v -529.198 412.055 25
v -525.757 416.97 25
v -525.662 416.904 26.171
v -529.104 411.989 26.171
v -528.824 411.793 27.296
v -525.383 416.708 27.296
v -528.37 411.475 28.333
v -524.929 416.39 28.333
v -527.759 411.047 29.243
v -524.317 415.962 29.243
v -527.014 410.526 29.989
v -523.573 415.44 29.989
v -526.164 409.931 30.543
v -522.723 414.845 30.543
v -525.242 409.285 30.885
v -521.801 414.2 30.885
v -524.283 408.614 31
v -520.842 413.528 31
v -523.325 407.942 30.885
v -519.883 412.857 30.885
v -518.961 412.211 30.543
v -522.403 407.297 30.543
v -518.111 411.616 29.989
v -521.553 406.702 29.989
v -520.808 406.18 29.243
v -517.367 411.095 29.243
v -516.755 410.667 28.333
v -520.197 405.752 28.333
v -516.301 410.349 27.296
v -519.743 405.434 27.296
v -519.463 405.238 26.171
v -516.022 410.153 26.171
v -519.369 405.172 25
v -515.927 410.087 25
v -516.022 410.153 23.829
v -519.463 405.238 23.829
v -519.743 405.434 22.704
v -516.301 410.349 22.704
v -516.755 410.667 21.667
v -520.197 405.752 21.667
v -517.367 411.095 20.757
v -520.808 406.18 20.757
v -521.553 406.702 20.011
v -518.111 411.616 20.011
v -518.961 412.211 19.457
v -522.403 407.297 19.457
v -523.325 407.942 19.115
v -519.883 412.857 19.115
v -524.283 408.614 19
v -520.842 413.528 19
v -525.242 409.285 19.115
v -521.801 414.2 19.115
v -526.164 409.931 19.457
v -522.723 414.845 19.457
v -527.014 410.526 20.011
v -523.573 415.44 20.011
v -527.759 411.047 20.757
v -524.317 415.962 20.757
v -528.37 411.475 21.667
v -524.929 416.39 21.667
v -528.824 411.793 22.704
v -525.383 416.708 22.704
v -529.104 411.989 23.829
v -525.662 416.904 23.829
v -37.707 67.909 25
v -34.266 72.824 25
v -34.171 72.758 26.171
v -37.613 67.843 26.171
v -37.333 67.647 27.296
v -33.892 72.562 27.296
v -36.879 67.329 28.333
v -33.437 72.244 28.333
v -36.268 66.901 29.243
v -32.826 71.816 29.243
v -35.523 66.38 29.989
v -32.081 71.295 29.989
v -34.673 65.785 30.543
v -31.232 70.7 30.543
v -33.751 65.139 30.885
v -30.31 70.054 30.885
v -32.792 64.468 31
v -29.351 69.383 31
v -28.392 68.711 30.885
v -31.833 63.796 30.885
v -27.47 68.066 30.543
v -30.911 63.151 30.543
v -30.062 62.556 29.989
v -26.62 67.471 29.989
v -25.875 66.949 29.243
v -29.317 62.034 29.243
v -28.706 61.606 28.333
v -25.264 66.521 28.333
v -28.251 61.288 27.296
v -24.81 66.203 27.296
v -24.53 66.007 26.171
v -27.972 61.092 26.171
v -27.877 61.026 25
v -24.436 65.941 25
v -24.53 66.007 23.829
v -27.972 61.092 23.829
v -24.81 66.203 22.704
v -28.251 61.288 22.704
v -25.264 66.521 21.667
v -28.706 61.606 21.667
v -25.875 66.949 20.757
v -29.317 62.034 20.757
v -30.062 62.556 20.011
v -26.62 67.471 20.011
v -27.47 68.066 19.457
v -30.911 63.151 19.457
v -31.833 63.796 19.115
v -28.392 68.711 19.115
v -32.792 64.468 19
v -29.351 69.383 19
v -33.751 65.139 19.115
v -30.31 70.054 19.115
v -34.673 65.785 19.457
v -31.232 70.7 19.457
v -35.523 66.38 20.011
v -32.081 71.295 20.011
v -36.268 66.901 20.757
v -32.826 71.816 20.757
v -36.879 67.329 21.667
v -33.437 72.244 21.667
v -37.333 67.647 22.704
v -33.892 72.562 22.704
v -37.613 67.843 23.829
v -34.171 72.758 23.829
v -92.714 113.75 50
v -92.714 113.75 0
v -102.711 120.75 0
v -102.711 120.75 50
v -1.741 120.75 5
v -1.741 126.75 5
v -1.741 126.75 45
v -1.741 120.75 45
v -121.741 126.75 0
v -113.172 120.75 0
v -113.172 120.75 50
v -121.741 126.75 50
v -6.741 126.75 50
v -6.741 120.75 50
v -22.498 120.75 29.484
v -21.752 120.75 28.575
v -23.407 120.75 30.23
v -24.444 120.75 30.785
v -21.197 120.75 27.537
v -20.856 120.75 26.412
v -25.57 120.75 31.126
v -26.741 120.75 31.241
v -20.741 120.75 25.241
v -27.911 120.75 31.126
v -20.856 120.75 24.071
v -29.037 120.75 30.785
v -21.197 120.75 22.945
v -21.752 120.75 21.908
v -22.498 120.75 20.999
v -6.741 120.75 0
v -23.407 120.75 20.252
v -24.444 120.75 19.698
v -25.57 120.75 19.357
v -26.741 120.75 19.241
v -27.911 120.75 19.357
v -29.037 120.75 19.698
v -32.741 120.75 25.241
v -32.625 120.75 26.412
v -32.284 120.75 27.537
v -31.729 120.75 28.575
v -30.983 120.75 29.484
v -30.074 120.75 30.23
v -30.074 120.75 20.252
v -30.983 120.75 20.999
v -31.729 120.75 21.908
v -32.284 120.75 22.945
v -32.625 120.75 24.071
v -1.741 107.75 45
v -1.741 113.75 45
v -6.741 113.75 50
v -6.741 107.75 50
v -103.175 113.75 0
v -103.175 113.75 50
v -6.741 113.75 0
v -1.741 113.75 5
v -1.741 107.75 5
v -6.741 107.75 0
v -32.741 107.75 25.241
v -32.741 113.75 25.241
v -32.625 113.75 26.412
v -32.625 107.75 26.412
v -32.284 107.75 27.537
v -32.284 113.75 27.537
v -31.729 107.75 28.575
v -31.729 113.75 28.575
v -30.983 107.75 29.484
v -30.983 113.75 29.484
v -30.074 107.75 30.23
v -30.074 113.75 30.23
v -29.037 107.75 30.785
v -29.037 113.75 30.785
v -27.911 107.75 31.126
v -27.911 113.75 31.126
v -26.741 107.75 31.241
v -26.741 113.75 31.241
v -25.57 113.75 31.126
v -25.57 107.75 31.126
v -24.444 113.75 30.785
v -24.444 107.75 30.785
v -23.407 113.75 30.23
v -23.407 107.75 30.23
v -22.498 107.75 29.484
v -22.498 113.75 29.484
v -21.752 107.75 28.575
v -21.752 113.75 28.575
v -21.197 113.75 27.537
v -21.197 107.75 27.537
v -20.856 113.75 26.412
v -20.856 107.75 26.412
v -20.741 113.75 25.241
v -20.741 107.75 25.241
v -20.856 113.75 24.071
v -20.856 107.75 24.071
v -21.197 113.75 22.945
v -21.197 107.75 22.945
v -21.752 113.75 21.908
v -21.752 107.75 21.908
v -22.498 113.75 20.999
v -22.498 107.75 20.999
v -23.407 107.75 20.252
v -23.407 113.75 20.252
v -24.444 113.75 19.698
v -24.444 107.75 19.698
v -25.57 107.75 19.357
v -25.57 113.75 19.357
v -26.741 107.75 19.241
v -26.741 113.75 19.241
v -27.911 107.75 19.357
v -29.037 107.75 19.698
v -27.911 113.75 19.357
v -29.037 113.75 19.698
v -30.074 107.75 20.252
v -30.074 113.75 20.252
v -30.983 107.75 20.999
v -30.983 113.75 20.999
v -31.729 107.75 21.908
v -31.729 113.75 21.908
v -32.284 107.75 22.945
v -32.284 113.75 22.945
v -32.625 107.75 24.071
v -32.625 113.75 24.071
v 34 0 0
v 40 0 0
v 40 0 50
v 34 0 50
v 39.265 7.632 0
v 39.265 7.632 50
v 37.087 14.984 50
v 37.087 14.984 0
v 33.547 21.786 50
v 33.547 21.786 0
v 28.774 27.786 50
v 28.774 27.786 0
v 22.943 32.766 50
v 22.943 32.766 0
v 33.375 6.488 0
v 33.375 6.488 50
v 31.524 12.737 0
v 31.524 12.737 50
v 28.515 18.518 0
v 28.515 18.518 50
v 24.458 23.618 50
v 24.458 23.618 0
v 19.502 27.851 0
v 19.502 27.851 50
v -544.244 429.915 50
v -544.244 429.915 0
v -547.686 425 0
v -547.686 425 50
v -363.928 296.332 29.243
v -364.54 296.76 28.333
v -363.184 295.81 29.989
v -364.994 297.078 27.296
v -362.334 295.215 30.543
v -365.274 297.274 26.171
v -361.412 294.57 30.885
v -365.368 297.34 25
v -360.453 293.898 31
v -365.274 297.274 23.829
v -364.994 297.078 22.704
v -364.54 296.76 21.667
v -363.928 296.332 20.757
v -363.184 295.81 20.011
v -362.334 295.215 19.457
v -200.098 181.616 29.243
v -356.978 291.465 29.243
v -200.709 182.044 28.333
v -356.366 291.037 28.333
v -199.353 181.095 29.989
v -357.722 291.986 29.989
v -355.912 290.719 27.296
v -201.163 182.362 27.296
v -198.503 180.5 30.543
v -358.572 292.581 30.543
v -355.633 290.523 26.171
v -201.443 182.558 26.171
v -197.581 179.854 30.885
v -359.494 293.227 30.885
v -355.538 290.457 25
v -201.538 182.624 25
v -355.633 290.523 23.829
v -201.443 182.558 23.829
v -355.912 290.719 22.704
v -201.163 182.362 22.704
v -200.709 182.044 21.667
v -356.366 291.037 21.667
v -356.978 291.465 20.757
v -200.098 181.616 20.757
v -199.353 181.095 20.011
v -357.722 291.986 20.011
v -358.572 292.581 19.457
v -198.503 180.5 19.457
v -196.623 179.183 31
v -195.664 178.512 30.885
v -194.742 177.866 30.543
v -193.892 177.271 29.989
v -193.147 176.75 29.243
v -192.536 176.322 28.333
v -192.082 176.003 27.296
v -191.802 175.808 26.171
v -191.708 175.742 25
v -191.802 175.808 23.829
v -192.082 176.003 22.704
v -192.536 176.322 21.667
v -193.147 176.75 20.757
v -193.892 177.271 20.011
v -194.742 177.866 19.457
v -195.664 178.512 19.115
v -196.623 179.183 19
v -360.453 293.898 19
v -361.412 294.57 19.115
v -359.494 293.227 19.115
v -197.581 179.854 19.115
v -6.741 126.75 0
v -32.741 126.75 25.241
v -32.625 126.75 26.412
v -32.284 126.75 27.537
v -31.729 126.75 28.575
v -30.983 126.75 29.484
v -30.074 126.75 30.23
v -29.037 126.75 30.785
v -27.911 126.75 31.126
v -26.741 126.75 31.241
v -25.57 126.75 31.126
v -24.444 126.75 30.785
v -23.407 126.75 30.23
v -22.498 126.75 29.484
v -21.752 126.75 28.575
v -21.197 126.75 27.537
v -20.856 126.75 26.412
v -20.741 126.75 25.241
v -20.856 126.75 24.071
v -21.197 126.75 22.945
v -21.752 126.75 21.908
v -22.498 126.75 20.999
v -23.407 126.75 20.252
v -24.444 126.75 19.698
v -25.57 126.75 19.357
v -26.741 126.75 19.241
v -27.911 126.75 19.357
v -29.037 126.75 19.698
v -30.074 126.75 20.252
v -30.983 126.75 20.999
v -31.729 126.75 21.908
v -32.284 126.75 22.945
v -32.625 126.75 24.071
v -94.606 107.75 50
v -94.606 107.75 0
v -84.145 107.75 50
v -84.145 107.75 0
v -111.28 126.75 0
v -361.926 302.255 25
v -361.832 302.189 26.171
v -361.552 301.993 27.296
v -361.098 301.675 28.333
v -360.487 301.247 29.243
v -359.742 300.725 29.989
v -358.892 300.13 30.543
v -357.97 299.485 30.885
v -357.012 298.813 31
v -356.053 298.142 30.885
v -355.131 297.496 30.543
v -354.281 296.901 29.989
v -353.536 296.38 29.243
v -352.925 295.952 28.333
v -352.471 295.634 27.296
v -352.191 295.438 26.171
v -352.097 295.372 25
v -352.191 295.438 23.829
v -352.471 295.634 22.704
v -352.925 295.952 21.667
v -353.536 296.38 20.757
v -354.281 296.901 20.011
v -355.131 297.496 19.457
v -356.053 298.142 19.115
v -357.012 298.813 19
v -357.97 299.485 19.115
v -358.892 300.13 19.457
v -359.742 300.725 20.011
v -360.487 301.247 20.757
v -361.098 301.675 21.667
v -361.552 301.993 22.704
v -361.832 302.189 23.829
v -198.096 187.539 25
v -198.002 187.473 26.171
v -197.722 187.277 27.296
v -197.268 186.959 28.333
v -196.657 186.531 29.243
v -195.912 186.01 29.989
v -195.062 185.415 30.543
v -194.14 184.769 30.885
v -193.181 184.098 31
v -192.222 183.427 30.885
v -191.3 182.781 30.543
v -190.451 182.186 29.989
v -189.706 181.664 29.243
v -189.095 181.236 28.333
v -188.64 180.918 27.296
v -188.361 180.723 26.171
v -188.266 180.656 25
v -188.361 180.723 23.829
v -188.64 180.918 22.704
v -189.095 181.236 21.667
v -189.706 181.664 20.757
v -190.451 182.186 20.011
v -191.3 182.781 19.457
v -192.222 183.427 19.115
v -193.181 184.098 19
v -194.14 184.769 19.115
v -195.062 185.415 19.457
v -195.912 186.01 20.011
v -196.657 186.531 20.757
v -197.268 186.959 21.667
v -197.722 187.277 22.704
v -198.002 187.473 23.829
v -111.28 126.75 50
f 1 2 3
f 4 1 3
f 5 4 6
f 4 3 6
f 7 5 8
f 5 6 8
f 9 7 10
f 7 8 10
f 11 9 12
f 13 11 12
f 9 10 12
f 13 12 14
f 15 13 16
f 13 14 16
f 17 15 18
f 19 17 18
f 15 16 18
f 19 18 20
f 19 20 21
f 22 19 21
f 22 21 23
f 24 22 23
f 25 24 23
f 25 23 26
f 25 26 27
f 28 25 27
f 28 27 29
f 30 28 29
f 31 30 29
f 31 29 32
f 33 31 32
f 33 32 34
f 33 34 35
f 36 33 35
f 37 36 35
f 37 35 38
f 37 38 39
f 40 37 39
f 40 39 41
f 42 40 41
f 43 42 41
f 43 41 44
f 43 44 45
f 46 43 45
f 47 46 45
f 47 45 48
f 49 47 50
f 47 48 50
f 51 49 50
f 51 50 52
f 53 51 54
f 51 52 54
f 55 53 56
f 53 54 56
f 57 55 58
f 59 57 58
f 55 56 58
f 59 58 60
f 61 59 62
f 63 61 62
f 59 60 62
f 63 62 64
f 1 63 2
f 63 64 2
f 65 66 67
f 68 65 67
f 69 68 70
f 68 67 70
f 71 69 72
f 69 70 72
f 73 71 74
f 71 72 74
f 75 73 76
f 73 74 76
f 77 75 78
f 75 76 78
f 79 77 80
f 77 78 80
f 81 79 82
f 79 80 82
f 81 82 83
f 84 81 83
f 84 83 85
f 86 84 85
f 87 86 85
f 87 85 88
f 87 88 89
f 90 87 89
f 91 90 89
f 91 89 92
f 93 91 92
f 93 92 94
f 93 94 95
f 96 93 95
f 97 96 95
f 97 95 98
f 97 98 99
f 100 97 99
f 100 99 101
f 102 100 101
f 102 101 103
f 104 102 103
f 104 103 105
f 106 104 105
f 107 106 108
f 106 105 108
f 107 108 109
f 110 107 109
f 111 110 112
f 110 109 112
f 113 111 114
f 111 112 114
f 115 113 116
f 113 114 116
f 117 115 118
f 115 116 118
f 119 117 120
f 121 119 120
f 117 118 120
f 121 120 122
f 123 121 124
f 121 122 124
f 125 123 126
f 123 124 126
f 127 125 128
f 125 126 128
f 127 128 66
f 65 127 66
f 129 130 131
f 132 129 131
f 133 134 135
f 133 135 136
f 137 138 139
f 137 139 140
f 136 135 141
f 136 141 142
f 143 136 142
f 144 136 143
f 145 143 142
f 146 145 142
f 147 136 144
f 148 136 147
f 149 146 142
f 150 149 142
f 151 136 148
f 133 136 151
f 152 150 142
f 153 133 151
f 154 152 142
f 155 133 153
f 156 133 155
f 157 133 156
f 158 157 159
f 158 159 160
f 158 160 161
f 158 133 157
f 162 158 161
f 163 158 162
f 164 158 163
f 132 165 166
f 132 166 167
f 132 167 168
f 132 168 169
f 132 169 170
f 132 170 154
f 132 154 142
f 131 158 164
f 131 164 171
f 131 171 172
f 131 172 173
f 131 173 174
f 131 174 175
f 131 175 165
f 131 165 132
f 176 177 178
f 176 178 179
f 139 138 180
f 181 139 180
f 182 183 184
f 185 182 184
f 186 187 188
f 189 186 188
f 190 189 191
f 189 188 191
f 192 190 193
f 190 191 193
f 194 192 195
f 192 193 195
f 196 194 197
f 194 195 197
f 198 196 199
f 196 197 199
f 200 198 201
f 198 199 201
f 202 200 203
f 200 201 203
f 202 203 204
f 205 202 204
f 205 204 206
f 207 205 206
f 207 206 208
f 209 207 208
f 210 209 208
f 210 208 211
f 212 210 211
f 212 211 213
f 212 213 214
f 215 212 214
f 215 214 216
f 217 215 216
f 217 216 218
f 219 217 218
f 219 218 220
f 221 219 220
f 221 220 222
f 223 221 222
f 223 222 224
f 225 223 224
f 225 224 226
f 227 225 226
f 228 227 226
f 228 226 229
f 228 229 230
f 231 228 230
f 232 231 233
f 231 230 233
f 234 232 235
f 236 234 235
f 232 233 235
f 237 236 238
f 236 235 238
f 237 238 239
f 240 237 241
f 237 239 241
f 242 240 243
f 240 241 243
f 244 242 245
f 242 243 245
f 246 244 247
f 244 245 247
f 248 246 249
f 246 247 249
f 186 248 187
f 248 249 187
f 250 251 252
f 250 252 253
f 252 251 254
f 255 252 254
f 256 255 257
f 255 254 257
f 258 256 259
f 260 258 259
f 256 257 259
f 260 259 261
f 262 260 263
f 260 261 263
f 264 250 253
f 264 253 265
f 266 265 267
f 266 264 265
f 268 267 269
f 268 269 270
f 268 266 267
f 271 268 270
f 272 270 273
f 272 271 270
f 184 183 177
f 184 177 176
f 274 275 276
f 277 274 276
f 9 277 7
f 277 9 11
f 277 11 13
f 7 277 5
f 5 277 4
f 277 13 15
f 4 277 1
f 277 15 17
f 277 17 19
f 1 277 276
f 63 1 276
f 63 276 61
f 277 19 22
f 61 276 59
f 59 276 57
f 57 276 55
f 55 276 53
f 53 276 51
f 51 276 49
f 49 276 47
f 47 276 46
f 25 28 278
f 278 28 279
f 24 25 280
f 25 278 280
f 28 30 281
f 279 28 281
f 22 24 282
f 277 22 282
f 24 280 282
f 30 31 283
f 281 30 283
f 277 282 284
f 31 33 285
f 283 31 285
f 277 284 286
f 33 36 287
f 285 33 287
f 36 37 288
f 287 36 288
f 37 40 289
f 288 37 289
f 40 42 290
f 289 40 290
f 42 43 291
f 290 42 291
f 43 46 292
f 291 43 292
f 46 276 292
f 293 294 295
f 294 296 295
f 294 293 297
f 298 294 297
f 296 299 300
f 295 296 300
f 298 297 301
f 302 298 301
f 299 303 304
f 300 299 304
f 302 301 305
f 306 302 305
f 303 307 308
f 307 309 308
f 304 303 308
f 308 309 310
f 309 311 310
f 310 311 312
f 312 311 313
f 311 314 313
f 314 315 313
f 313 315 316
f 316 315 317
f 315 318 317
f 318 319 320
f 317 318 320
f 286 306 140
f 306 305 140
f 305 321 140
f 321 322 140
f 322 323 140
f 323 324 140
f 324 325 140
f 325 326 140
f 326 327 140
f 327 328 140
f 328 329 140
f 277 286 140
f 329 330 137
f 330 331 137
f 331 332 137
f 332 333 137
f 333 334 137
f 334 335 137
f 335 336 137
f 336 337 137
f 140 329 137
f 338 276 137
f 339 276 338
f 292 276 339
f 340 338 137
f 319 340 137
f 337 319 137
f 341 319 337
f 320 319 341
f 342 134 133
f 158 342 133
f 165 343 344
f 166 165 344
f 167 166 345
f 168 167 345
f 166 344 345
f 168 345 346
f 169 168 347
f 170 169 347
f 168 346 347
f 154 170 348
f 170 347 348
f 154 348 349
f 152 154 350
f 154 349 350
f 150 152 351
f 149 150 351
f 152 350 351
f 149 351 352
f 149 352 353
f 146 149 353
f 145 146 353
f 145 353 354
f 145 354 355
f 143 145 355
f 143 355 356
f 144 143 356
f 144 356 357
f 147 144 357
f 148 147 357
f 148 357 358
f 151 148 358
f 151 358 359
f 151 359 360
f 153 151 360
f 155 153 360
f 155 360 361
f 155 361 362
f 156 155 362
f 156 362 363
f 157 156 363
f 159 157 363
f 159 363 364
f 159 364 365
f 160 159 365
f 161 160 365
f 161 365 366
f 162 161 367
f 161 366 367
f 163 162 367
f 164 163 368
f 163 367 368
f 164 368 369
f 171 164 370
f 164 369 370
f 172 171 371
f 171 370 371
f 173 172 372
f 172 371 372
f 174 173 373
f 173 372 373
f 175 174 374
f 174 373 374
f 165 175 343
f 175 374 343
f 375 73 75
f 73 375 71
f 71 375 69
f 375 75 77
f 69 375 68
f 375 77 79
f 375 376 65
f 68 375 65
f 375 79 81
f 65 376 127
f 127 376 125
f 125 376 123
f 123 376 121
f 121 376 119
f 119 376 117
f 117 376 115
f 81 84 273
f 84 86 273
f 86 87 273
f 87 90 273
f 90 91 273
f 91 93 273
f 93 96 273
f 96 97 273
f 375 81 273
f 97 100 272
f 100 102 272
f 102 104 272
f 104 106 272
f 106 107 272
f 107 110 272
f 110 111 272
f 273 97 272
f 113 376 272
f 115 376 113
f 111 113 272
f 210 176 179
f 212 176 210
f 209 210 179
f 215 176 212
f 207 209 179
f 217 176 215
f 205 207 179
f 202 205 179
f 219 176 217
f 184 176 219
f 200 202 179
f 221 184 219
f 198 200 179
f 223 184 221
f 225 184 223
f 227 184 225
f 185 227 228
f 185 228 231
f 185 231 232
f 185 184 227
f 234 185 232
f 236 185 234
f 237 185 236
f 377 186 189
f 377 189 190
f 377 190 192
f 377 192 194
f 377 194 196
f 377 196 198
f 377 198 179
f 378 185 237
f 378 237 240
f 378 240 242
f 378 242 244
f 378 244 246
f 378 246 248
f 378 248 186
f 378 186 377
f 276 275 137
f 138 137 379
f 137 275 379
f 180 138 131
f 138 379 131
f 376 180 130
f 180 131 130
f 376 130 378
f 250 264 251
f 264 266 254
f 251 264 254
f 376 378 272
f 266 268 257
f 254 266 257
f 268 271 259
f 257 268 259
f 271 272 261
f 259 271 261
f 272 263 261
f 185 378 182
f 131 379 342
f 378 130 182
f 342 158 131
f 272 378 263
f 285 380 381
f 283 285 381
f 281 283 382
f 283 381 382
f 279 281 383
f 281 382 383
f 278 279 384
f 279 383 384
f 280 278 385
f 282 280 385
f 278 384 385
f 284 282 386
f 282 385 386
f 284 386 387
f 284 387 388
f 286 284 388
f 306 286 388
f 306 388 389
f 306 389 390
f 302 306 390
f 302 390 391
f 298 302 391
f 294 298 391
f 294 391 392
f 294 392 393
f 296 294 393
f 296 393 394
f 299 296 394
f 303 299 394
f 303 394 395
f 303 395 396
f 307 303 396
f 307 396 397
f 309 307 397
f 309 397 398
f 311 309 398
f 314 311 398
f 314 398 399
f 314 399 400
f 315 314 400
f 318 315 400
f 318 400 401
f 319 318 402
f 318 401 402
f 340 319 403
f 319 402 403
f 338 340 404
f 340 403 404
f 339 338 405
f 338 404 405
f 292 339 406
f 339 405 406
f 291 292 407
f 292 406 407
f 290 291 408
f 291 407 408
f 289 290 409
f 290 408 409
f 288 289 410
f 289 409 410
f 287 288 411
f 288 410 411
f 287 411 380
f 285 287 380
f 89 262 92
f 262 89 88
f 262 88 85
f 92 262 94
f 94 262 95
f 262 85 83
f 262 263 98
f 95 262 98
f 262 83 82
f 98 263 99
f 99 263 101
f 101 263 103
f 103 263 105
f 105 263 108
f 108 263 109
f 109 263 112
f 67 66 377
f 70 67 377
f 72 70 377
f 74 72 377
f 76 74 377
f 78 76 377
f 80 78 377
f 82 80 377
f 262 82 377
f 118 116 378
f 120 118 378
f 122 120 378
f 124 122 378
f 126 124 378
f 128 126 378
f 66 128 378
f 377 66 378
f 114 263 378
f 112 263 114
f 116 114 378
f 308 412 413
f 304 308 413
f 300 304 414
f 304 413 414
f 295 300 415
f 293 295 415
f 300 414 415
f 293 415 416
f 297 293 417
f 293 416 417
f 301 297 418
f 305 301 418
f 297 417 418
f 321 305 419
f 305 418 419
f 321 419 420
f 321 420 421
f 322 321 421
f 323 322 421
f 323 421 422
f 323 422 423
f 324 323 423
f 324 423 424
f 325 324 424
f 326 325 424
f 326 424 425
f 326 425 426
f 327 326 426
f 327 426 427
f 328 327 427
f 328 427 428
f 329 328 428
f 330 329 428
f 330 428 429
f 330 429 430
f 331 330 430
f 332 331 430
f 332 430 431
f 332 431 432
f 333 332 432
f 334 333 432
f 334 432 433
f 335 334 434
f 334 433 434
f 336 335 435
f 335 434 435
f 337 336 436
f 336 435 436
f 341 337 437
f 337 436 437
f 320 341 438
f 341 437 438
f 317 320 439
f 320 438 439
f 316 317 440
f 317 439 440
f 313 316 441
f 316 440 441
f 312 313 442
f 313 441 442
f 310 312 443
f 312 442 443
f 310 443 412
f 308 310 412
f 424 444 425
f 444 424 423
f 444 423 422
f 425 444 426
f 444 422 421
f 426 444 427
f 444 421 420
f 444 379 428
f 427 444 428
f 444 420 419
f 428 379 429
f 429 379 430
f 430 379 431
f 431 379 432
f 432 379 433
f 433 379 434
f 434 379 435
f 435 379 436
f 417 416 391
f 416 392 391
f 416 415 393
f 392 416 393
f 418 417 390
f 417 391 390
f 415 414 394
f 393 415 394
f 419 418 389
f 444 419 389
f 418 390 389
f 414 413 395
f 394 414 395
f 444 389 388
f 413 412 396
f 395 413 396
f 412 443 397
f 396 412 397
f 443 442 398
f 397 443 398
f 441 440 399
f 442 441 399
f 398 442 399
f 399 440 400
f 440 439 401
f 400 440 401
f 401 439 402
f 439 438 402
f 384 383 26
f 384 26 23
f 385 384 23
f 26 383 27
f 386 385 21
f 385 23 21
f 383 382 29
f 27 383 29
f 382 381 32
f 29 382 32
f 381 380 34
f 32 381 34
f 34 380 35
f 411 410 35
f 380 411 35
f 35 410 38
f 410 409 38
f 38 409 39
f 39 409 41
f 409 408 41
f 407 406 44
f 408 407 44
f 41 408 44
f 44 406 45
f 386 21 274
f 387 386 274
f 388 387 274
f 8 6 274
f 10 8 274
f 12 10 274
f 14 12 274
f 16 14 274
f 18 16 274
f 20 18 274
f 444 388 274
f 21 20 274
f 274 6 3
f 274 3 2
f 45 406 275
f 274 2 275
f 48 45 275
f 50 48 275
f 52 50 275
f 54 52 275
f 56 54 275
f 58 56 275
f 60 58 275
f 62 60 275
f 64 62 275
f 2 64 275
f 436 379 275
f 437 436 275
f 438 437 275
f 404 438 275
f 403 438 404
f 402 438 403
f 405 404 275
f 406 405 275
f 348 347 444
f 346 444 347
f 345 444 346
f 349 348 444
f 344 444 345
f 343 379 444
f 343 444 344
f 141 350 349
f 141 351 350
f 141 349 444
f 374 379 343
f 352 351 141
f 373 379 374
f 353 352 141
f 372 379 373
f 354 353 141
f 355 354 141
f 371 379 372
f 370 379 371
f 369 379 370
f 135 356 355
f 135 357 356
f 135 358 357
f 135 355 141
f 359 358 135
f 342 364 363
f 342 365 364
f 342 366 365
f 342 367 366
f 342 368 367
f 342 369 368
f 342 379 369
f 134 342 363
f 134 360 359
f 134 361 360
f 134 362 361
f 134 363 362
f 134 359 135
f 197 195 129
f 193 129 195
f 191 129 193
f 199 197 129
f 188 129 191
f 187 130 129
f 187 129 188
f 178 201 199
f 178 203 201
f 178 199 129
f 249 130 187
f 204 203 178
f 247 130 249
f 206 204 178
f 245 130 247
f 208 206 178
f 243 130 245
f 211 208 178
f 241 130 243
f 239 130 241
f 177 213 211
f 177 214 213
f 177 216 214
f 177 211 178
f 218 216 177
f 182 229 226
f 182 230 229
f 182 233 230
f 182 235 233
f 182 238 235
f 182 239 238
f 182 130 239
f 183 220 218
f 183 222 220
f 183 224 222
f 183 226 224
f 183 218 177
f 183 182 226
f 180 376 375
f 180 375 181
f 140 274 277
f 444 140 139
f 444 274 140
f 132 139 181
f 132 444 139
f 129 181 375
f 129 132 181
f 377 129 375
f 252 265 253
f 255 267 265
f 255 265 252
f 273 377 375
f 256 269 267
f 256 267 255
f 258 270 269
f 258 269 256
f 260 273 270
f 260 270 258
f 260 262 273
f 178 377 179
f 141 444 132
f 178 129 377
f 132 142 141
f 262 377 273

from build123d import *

# Parameters (mm, degrees)
PAD_DEPTH              = 50
PAD001_DEPTH           = 50
SKETCH002_R            = 6
POCKET_DEPTH           = 30
SKETCH015_R            = 6
POCKET005_DEPTH        = 354.1406188228
LINEARPATTERN003_COUNT = 4
LINEARPATTERN003_PITCH = 200
CHAMFER_SIZE           = 5


with BuildPart() as part:
    # Sketch → Pad (new body)
    with BuildSketch(Plane.XY):
        with BuildLine():
            Line((-547.6857118143, 425), (19.5015988359, 27.8511695058))
            ThreePointArc((34, 0), (30.1583683281, 15.69945285), (19.5015988359, 27.8511695058))
            Line((40, 0), (34, 0))
            ThreePointArc((40, 0), (35.4804333271, 18.4699445294), (22.943057454, 32.7660817716))
            Line((22.943057454, 32.7660817716), (-544.2442531962, 429.9149122657))
            Line((-544.2442531962, 429.9149122657), (-547.6857118143, 425))
        make_face()
    extrude(amount=PAD_DEPTH)

    # Sketch001 → Pad001 (join)
    with BuildSketch(Plane.XY):
        Polygon((-94.6057566753, 107.75), (-103.1746447158, 113.75), (-1.7405688034, 113.75), (-1.7405688034, 107.75), align=None)
        Polygon((-113.171680763, 120.75), (-121.7405688034, 126.75), (-1.7405688034, 126.75), (-1.7405688034, 120.75), align=None)
    extrude(amount=PAD001_DEPTH)

    # Sketch002 → Pocket (cut)
    with BuildSketch(Plane(origin=(0, 126.75, 0), x_dir=(-1, 0, 0), z_dir=(0, 1, 0))):
        with Locations((26.7405688034, 25.24131)):
            Circle(SKETCH002_R)
    extrude(amount=-POCKET_DEPTH, mode=Mode.SUBTRACT)

    # Sketch015 (on Face2 of LinearPattern) → Pocket005 (cut, through all)
    with BuildSketch(Plane(origin=(22.943057454, 32.7660817716, 0), x_dir=(-0.8191520443, 0.5735764364, 0), z_dir=(0.5735764364, 0.8191520443, 0))):
        with Locations((663.8389678693, 25)):
            Circle(SKETCH015_R)
    pocket005 = extrude(amount=-POCKET005_DEPTH, mode=Mode.SUBTRACT)

    # LinearPattern003: Pocket005 ×4
    with Locations(*[Vector(0.8191520443, -0.5735764364, 0) * (i * LINEARPATTERN003_PITCH) for i in range(1, LINEARPATTERN003_COUNT)]):
        add(pocket005, mode=Mode.SUBTRACT)

    # Chamfer
    chamfer_edges = [part.edges().sort_by_distance(p)[0] for p in [
        (-1.740569, 123.75, 50),
        (-1.740569, 123.75, 0),
        (-1.740569, 110.75, 0),
        (-1.740569, 110.75, 50),
    ]]
    chamfer(chamfer_edges, length=CHAMFER_SIZE)


solid = part.part
